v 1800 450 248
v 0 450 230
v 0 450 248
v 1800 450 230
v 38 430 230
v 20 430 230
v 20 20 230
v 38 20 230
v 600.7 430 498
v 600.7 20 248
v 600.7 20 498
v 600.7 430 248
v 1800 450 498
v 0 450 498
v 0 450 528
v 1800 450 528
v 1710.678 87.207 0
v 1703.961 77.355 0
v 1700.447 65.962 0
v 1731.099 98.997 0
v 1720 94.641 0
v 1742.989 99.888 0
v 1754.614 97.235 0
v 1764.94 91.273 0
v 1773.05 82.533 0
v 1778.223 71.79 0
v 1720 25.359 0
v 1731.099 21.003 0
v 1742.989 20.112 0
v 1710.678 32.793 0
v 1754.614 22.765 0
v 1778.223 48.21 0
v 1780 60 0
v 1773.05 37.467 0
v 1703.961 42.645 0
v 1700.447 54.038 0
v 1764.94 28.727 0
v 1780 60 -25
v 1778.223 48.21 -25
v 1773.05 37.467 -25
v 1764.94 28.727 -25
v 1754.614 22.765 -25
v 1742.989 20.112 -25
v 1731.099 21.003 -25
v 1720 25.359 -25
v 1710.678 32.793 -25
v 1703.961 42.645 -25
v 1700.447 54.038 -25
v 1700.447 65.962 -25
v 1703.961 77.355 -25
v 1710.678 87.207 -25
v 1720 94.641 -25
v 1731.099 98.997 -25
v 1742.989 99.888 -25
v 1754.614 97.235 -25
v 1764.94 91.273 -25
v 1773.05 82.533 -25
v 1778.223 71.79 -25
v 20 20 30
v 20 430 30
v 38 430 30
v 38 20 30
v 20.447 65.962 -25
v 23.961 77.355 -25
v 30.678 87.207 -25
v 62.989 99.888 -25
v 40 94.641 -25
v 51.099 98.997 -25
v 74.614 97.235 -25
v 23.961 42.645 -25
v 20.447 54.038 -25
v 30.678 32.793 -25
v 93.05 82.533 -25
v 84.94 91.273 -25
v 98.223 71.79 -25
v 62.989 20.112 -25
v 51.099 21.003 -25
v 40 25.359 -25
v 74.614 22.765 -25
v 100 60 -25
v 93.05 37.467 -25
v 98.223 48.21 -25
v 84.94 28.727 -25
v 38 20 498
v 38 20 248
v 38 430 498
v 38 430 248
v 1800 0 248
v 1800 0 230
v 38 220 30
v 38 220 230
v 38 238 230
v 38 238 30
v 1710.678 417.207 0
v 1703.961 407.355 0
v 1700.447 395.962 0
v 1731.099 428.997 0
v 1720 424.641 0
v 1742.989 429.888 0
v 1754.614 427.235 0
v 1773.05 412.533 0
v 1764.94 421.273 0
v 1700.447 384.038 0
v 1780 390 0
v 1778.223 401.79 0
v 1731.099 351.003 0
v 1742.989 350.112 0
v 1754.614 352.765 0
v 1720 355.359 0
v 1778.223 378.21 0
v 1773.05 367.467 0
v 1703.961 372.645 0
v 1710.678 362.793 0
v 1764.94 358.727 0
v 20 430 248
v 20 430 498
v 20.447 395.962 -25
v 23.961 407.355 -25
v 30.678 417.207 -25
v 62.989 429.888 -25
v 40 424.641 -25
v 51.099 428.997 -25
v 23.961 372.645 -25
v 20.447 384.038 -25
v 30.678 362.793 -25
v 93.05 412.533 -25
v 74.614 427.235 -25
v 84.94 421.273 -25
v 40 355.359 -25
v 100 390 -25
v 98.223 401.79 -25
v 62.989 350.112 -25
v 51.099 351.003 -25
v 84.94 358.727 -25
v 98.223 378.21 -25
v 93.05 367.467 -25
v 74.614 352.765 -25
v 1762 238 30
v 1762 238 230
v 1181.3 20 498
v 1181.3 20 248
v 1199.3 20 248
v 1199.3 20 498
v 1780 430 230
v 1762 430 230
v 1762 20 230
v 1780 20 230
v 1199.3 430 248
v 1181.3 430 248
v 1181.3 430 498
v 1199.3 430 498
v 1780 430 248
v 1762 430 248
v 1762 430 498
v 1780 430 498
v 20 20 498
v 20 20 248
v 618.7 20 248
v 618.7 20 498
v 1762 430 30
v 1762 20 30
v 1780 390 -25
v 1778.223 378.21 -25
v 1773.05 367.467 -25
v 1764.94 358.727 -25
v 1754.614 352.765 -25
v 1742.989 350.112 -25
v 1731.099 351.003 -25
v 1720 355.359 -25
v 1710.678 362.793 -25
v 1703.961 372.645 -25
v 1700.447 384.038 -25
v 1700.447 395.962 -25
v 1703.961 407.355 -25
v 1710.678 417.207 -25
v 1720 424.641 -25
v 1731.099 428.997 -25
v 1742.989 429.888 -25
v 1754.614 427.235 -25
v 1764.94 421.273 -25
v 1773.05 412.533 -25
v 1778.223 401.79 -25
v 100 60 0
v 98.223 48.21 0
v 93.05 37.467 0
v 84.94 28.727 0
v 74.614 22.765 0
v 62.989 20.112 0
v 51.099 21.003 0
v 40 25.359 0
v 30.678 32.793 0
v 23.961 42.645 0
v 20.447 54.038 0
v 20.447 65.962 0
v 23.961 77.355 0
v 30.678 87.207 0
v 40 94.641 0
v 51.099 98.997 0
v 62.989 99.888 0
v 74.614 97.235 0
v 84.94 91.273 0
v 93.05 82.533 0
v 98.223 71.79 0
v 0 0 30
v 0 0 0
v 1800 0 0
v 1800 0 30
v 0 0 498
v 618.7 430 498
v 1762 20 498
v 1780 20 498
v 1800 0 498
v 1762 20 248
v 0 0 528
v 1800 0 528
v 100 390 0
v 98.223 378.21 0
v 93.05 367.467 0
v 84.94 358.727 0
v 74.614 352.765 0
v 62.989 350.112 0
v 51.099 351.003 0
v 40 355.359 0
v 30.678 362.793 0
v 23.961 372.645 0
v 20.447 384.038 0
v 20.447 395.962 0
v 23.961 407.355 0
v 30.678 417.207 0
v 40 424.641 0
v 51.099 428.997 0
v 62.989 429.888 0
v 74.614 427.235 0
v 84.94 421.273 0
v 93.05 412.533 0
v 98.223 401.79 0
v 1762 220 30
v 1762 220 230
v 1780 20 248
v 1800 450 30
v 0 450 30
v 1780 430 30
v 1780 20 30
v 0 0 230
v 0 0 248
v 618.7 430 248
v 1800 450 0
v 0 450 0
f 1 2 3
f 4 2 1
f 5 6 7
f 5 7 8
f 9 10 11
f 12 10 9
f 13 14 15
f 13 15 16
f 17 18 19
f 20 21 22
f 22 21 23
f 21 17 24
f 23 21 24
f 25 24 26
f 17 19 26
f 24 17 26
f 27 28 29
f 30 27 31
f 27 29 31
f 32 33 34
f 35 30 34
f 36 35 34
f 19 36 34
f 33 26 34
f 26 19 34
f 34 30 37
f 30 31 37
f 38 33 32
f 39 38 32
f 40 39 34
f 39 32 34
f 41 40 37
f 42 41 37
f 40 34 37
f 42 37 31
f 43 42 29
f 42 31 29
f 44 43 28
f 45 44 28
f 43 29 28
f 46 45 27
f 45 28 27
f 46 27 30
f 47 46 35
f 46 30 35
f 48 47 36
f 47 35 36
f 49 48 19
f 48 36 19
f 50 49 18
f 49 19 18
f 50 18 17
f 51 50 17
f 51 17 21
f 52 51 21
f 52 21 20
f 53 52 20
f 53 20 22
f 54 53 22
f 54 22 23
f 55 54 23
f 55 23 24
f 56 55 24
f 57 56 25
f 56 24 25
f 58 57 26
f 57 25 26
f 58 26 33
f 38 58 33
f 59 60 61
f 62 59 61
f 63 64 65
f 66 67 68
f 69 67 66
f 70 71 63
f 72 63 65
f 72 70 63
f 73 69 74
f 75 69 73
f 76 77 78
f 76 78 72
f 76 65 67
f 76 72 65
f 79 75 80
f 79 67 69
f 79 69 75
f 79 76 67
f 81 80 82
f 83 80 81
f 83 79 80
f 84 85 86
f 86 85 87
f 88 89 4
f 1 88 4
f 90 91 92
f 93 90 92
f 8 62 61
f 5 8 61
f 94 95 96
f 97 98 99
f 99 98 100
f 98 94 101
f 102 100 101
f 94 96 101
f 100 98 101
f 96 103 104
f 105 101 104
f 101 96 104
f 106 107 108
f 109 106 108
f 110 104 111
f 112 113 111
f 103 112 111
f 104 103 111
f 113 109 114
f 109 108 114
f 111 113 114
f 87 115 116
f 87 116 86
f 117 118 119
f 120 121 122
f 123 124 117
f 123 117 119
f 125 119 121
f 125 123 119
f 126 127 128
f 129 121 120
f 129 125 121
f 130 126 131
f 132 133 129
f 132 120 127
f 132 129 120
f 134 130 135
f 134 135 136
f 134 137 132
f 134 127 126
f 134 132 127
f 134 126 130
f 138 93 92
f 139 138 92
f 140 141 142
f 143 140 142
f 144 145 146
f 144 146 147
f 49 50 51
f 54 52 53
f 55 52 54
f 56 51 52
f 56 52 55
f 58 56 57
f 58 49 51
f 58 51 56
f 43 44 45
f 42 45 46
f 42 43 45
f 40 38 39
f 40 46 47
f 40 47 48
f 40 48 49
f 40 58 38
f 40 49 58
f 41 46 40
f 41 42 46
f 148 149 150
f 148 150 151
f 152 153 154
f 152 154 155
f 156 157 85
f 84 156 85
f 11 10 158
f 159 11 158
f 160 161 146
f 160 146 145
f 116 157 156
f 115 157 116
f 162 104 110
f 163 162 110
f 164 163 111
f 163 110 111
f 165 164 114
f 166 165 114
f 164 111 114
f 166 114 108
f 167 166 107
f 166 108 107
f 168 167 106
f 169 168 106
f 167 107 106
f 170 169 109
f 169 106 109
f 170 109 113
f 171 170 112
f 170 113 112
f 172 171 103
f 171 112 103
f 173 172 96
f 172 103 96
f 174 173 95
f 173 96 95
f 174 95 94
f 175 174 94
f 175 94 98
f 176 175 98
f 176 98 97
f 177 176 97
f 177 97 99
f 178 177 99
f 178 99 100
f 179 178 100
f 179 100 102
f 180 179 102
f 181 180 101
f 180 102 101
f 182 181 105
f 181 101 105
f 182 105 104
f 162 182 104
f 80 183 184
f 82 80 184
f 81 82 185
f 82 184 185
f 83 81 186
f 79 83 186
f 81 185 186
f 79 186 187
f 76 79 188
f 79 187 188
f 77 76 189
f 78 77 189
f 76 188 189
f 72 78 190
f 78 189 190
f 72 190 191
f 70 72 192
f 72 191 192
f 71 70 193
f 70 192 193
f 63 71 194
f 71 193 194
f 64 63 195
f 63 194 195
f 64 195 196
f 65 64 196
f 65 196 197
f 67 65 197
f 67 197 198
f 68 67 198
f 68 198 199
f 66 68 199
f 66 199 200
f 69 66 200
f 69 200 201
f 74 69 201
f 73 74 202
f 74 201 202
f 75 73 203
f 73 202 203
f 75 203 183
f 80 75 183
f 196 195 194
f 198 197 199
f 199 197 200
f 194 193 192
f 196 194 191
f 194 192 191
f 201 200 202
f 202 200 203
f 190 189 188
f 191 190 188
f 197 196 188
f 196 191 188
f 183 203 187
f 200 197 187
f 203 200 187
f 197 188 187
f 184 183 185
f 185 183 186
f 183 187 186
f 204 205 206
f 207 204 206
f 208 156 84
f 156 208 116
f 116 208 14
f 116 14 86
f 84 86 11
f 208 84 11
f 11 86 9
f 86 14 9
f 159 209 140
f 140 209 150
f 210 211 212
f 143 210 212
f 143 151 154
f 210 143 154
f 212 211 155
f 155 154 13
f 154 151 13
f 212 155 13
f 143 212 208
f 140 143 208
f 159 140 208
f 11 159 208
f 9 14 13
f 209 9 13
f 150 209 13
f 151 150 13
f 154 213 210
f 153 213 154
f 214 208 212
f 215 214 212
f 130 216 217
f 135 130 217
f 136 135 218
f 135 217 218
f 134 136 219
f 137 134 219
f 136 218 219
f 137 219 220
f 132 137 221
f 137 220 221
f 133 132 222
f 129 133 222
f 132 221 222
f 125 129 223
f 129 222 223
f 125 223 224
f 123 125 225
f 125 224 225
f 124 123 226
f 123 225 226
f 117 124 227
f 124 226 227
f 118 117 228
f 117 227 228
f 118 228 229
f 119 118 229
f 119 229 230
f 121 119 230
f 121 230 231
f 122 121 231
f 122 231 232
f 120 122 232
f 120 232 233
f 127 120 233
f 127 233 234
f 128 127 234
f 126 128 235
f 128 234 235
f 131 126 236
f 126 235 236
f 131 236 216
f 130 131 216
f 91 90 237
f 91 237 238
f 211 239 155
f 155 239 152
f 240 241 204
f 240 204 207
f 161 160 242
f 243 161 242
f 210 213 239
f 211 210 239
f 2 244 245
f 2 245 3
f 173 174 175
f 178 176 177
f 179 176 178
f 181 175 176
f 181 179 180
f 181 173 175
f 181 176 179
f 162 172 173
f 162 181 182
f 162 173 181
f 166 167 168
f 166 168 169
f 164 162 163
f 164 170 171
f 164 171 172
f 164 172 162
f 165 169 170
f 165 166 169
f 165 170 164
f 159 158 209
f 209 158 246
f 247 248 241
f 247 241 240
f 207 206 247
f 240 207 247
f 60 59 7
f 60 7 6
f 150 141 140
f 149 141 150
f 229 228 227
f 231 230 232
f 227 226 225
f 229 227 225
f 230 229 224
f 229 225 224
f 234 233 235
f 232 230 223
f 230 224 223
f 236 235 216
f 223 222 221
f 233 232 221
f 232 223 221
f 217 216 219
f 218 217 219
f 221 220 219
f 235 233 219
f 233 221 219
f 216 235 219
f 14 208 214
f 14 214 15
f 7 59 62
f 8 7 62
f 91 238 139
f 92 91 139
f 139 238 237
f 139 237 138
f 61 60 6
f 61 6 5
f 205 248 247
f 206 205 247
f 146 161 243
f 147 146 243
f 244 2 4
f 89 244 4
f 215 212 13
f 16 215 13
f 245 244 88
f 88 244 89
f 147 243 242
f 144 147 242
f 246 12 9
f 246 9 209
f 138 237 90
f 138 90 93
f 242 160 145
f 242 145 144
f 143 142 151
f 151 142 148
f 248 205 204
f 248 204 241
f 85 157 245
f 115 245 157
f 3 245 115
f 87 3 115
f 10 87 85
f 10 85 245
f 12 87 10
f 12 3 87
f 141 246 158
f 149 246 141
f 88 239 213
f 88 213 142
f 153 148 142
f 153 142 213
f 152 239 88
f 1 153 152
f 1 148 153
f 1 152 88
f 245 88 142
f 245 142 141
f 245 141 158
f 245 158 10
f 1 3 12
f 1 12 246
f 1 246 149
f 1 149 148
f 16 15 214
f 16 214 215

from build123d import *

# Parameters (mm, degrees)
F0_W      = 1800
F0_H      = 450
F1_DEPTH  = 30
F2_W      = 18
F2_H      = 410
F3_DEPTH  = 200
F4_W      = 18
F4_H      = 200
F5_DEPTH  = 1724
F7_W      = 1800
F7_H      = 450
F8_DEPTH  = 18
F9_W      = 18
F9_H      = 410
F10_DEPTH = 250
F12_W     = 1800
F12_H     = 450
F13_DEPTH = 30
F14_R     = 40
F15_DEPTH = 25


with BuildPart() as f1:
    # F0 (on Top) → F1 (new body)
    with BuildSketch(Plane.XY):
        with Locations((900, 225)):
            Rectangle(F0_W, F0_H)
    extrude(amount=F1_DEPTH)


with BuildPart() as f3:
    # F2 (on face) → F3 (new body)
    with BuildSketch(Plane.XY.offset(30)):
        with Locations((29, 225)):
            Rectangle(F2_W, F2_H)
        with Locations((1771, 225)):
            Rectangle(F2_W, F2_H)
    extrude(amount=F3_DEPTH)


with BuildPart() as f5:
    # F4 (on face) → F5 (new body)
    with BuildSketch(Plane.YZ.offset(38)):
        with Locations((229, 130)):
            Rectangle(F4_W, F4_H)
    extrude(amount=F5_DEPTH)


with BuildPart() as f8:
    # F7 (on offset) → F8 (new body)
    with BuildSketch(Plane.XY.offset(230)):
        with Locations((900, 225)):
            Rectangle(F7_W, F7_H)
    extrude(amount=F8_DEPTH)

    # F9 (on face) → F10 (join)
    with BuildSketch(Plane.XY.offset(248)):
        with Locations((1771, 225)):
            Rectangle(F9_W, F9_H)
        with Locations((609.7, 225)):
            Rectangle(F9_W, F9_H)
        with Locations((1190.3, 225)):
            Rectangle(F9_W, F9_H)
        with Locations((29, 225)):
            Rectangle(F9_W, F9_H)
    extrude(amount=F10_DEPTH)

    # F12 (on offset) → F13 (join)
    with BuildSketch(Plane.XY.offset(498)):
        with Locations((900, 225)):
            Rectangle(F12_W, F12_H)
    extrude(amount=F13_DEPTH)


with BuildPart() as f15:
    # F14 (on face) → F15 (new body)
    with BuildSketch(Plane(origin=(0, 0, 0), x_dir=(1, 0, 0), z_dir=(0, 0, -1))):
        with Locations((60, -390)):
            Circle(F14_R)
        with Locations((60, -60)):
            Circle(F14_R)
        with Locations((1740, -390)):
            Circle(F14_R)
        with Locations((1740, -60)):
            Circle(F14_R)
    extrude(amount=F15_DEPTH)


solid = Compound([f1.part, f3.part, f5.part, f8.part, f15.part])
